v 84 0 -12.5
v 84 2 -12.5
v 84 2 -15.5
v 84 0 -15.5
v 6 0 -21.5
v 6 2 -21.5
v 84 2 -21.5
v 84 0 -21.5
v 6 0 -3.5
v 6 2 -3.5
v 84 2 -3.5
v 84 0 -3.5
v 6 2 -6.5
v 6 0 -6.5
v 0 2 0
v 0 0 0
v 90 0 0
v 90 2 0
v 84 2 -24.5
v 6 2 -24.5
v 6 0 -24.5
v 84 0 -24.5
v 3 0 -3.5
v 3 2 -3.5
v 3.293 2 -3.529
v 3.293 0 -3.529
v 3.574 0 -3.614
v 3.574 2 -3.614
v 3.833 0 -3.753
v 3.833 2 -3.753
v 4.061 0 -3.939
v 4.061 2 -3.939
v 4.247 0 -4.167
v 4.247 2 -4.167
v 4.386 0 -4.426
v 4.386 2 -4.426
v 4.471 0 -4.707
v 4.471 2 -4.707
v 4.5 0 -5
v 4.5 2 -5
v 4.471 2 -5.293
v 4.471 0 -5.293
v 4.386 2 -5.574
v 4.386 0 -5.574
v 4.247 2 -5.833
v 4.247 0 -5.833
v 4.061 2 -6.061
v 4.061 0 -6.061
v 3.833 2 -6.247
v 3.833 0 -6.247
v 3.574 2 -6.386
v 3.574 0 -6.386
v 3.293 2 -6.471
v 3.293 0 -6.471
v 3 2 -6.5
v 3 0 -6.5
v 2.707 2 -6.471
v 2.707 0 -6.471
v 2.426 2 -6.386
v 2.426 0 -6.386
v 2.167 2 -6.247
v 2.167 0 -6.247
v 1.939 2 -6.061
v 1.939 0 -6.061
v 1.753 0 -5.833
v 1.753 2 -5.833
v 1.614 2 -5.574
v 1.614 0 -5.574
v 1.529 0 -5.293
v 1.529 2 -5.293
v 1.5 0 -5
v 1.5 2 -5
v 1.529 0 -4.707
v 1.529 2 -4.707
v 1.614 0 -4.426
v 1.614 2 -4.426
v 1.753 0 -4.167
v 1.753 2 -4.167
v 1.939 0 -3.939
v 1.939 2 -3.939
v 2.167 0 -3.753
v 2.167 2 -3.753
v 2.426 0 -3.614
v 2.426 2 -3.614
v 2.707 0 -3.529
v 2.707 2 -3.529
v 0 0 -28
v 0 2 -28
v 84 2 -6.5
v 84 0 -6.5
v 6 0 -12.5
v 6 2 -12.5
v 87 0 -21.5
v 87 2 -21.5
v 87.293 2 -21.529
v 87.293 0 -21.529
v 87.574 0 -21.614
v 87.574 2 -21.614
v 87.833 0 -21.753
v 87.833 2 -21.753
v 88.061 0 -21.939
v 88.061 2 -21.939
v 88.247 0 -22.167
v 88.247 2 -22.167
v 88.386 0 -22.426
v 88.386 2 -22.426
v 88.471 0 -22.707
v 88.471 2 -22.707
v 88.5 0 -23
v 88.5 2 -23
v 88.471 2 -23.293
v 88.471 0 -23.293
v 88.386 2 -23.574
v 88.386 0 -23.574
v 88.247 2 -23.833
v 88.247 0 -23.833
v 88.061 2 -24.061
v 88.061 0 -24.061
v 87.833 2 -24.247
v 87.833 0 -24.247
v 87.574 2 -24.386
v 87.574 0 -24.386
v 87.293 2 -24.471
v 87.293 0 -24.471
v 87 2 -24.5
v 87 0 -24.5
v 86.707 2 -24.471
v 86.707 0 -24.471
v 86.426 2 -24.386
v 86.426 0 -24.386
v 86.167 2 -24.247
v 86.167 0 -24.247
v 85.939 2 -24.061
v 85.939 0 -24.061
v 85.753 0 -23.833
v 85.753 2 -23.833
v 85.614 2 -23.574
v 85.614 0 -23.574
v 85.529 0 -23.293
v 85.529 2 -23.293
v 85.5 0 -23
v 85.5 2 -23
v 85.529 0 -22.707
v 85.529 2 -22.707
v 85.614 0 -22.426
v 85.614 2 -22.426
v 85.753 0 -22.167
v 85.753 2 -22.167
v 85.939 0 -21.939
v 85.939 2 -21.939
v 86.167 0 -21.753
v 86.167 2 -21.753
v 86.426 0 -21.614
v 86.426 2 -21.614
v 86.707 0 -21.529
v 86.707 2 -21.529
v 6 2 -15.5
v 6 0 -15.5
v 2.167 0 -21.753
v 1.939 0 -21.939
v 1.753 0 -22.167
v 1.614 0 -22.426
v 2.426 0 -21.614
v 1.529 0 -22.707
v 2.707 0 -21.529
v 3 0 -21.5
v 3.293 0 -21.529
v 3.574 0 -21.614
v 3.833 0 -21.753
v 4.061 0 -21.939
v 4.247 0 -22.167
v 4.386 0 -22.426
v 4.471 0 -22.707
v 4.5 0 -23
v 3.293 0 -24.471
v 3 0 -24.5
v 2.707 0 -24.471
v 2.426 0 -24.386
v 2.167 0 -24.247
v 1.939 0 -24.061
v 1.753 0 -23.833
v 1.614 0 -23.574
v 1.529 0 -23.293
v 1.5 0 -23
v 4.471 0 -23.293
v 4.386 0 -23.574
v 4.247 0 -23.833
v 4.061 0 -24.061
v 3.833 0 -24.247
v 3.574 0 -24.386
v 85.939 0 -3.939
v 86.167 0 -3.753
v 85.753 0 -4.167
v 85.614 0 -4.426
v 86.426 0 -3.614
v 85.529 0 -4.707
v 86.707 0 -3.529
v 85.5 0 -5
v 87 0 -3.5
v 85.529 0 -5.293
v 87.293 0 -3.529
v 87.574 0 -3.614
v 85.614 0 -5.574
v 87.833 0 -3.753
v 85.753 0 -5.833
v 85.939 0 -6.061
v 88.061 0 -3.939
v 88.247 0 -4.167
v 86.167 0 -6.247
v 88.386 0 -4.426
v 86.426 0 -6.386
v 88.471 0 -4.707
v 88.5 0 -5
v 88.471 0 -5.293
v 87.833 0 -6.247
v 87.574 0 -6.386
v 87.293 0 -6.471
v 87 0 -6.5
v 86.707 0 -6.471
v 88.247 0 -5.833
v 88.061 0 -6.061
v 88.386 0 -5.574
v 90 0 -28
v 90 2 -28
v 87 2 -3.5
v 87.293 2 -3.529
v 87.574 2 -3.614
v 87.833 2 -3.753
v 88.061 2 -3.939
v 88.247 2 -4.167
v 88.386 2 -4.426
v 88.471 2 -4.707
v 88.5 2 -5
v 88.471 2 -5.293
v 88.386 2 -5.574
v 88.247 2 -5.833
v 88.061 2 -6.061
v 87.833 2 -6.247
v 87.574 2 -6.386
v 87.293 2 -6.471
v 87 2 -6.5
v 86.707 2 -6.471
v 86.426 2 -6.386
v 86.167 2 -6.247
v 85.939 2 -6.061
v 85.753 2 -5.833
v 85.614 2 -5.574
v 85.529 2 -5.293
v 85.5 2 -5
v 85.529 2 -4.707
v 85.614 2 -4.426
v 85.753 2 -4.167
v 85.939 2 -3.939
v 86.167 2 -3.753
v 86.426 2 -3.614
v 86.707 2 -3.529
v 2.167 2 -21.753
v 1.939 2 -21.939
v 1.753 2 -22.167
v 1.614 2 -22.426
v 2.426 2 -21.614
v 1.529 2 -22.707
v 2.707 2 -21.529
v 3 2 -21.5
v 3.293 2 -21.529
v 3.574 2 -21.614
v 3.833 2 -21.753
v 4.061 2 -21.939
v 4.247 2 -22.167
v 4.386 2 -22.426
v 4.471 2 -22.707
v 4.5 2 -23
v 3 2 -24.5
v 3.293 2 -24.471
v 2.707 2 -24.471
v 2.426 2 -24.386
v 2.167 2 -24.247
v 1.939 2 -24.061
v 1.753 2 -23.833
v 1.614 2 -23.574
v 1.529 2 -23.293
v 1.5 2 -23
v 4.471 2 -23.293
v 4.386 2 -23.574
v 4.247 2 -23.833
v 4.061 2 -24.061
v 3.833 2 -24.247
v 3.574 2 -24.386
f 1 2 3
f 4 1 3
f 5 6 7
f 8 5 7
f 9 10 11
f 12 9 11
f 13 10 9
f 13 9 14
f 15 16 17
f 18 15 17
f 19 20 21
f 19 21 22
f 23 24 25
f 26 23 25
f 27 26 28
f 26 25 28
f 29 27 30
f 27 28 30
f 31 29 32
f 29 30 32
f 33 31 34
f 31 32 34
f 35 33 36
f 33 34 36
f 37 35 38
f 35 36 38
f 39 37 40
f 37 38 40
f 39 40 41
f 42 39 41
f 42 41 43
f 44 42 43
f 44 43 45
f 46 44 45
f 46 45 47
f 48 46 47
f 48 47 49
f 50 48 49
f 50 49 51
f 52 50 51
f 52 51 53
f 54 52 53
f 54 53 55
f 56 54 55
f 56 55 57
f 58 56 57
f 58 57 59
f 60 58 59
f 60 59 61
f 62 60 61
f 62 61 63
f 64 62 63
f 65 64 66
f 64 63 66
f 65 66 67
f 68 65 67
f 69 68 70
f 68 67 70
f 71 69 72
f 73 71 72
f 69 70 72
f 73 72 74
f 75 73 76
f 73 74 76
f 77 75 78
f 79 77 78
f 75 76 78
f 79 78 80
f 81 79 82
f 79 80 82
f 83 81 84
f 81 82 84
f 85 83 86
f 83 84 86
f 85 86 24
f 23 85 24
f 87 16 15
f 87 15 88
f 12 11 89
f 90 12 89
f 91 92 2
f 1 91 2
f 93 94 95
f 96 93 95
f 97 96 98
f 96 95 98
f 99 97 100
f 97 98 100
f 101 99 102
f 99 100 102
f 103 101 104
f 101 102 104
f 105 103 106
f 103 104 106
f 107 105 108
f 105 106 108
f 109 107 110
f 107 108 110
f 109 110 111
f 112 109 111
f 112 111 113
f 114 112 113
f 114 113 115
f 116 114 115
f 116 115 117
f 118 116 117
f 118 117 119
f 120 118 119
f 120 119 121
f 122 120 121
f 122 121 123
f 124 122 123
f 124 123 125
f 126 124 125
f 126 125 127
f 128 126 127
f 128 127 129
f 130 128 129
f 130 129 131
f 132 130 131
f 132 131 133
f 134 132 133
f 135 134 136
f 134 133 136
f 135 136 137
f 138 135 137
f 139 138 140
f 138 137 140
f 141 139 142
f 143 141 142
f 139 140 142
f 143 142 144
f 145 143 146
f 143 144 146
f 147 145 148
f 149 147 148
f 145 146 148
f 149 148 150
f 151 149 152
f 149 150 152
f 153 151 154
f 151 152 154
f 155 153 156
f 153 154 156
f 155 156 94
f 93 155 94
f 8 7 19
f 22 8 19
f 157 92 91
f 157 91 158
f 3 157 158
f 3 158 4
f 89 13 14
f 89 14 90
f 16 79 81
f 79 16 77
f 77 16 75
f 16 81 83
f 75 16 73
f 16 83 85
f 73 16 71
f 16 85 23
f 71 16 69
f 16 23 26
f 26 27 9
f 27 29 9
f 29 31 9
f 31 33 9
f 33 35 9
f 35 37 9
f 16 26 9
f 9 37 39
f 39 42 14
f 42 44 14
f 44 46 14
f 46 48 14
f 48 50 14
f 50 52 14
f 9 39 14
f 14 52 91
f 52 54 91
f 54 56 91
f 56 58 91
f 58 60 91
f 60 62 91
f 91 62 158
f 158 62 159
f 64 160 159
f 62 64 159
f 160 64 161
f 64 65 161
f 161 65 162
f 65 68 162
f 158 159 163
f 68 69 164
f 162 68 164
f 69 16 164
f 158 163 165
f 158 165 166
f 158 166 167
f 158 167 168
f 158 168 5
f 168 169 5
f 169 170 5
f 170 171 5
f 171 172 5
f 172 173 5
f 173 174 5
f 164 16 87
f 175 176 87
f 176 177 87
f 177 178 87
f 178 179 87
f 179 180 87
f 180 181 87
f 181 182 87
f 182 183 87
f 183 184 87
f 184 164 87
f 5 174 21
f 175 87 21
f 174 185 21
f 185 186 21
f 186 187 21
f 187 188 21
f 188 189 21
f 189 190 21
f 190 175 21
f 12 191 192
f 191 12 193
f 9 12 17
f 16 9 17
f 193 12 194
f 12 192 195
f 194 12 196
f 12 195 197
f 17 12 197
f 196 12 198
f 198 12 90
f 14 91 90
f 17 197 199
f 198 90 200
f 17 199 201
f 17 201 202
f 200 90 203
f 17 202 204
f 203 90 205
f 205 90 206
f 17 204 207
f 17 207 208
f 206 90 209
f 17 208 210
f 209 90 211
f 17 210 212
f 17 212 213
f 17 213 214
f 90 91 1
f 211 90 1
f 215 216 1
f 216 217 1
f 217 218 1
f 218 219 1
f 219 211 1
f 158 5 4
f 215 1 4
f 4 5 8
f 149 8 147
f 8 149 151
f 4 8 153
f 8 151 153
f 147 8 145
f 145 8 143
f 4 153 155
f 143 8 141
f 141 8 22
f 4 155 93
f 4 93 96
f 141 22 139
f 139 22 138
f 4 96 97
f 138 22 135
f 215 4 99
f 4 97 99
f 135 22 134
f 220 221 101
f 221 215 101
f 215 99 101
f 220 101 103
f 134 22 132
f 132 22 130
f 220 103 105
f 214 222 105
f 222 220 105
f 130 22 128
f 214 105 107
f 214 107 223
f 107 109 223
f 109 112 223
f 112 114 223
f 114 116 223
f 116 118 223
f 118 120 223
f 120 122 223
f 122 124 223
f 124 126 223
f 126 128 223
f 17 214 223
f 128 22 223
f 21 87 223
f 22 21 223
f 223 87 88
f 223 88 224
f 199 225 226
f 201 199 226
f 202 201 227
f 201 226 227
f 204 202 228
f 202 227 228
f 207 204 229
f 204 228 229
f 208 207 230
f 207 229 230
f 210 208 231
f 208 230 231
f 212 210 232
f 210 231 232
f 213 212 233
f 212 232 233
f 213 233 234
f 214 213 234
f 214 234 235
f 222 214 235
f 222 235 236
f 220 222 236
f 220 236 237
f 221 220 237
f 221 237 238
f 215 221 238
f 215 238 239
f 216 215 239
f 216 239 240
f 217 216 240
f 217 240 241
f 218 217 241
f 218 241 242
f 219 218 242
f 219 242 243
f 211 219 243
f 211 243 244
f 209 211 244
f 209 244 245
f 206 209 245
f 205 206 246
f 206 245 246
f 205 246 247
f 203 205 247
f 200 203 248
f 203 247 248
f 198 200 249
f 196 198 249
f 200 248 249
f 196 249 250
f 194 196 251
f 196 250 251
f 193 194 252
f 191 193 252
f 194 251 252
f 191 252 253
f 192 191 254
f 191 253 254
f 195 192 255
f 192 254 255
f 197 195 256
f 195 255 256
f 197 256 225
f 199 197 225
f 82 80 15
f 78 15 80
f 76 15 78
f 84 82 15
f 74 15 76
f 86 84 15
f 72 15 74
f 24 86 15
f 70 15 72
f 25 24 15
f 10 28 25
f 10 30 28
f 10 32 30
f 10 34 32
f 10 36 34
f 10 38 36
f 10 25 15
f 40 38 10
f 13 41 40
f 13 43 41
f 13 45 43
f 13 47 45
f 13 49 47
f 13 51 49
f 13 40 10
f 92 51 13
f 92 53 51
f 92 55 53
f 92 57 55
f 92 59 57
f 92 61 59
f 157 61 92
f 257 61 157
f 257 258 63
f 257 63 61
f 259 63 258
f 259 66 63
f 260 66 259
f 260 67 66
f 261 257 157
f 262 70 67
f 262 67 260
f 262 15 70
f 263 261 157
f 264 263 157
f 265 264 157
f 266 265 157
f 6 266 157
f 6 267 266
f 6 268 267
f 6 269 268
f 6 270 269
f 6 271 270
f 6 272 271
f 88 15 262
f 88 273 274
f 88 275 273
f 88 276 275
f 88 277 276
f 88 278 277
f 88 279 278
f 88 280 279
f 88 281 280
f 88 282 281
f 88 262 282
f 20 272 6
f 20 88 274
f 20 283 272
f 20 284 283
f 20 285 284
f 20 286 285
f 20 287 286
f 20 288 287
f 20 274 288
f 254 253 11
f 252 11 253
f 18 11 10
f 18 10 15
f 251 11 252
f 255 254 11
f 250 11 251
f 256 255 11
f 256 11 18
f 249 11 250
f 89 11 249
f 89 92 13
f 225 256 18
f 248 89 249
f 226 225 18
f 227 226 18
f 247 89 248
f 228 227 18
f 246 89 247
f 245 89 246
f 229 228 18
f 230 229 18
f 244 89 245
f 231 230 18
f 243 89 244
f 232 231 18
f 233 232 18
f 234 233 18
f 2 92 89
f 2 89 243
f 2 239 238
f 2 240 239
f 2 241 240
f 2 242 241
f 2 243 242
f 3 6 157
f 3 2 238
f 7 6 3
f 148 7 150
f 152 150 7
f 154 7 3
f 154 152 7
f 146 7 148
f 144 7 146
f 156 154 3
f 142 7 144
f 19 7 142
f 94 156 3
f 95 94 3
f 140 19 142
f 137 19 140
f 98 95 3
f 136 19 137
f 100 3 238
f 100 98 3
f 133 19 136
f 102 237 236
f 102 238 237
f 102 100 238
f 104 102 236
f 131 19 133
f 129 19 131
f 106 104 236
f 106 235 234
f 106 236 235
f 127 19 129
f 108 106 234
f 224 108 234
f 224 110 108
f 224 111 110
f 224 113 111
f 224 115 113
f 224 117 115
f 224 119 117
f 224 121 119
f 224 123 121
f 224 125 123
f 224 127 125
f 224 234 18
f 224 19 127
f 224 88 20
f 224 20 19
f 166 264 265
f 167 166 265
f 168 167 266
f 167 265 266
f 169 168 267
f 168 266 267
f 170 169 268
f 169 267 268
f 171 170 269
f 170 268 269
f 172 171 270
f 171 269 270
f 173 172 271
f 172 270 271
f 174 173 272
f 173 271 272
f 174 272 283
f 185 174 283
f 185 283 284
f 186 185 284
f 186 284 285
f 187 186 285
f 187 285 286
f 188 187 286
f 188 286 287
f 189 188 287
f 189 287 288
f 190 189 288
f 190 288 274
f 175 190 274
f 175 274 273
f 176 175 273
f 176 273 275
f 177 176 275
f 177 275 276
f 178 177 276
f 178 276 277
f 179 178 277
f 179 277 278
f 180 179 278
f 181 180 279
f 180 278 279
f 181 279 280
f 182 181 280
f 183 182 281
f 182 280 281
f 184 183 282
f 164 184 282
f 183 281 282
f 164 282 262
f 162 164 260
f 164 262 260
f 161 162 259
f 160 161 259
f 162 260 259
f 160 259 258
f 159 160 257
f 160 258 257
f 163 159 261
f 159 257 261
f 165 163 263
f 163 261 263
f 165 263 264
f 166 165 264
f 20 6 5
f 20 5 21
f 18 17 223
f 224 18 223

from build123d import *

# Parameters (mm, degrees)
SKETCH1_W           = 90
SKETCH1_H           = 28
BOSS_EXTRUDE1_DEPTH = 2
SKETCH2_R           = 1.5
SKETCH2_W           = 78
SKETCH2_H           = 3
CUT_EXTRUDE1_DEPTH  = 95.276189995


with BuildPart() as part:
    # Sketch1 → Boss-Extrude1 (new body)
    with BuildSketch(Plane(origin=(0, 0, 0), x_dir=(1, 0, 0), z_dir=(0, 1, 0))):
        with Locations((45, 14)):
            Rectangle(SKETCH1_W, SKETCH1_H)
    extrude(amount=BOSS_EXTRUDE1_DEPTH)

    # Sketch2 → Cut-Extrude1 (cut, through all)
    with BuildSketch(Plane(origin=(0, 2, 0), x_dir=(1, 0, 0), z_dir=(0, 1, 0))):
        with Locations(Location((3, 23, 0), (0, 0, 270))):
            Circle(SKETCH2_R)
        with Locations(Location((3, 5, 0), (0, 0, 270))):
            Circle(SKETCH2_R)
        with Locations(Location((87, 23, 0), (0, 0, 270))):
            Circle(SKETCH2_R)
        with Locations(Location((87, 5, 0), (0, 0, 270))):
            Circle(SKETCH2_R)
        with Locations((45, 14)):
            Rectangle(SKETCH2_W, SKETCH2_H)
        with Locations((45, 5)):
            Rectangle(SKETCH2_W, SKETCH2_H)
        with Locations((45, 23)):
            Rectangle(SKETCH2_W, SKETCH2_H)
    extrude(amount=-CUT_EXTRUDE1_DEPTH, mode=Mode.SUBTRACT)


solid = part.part
